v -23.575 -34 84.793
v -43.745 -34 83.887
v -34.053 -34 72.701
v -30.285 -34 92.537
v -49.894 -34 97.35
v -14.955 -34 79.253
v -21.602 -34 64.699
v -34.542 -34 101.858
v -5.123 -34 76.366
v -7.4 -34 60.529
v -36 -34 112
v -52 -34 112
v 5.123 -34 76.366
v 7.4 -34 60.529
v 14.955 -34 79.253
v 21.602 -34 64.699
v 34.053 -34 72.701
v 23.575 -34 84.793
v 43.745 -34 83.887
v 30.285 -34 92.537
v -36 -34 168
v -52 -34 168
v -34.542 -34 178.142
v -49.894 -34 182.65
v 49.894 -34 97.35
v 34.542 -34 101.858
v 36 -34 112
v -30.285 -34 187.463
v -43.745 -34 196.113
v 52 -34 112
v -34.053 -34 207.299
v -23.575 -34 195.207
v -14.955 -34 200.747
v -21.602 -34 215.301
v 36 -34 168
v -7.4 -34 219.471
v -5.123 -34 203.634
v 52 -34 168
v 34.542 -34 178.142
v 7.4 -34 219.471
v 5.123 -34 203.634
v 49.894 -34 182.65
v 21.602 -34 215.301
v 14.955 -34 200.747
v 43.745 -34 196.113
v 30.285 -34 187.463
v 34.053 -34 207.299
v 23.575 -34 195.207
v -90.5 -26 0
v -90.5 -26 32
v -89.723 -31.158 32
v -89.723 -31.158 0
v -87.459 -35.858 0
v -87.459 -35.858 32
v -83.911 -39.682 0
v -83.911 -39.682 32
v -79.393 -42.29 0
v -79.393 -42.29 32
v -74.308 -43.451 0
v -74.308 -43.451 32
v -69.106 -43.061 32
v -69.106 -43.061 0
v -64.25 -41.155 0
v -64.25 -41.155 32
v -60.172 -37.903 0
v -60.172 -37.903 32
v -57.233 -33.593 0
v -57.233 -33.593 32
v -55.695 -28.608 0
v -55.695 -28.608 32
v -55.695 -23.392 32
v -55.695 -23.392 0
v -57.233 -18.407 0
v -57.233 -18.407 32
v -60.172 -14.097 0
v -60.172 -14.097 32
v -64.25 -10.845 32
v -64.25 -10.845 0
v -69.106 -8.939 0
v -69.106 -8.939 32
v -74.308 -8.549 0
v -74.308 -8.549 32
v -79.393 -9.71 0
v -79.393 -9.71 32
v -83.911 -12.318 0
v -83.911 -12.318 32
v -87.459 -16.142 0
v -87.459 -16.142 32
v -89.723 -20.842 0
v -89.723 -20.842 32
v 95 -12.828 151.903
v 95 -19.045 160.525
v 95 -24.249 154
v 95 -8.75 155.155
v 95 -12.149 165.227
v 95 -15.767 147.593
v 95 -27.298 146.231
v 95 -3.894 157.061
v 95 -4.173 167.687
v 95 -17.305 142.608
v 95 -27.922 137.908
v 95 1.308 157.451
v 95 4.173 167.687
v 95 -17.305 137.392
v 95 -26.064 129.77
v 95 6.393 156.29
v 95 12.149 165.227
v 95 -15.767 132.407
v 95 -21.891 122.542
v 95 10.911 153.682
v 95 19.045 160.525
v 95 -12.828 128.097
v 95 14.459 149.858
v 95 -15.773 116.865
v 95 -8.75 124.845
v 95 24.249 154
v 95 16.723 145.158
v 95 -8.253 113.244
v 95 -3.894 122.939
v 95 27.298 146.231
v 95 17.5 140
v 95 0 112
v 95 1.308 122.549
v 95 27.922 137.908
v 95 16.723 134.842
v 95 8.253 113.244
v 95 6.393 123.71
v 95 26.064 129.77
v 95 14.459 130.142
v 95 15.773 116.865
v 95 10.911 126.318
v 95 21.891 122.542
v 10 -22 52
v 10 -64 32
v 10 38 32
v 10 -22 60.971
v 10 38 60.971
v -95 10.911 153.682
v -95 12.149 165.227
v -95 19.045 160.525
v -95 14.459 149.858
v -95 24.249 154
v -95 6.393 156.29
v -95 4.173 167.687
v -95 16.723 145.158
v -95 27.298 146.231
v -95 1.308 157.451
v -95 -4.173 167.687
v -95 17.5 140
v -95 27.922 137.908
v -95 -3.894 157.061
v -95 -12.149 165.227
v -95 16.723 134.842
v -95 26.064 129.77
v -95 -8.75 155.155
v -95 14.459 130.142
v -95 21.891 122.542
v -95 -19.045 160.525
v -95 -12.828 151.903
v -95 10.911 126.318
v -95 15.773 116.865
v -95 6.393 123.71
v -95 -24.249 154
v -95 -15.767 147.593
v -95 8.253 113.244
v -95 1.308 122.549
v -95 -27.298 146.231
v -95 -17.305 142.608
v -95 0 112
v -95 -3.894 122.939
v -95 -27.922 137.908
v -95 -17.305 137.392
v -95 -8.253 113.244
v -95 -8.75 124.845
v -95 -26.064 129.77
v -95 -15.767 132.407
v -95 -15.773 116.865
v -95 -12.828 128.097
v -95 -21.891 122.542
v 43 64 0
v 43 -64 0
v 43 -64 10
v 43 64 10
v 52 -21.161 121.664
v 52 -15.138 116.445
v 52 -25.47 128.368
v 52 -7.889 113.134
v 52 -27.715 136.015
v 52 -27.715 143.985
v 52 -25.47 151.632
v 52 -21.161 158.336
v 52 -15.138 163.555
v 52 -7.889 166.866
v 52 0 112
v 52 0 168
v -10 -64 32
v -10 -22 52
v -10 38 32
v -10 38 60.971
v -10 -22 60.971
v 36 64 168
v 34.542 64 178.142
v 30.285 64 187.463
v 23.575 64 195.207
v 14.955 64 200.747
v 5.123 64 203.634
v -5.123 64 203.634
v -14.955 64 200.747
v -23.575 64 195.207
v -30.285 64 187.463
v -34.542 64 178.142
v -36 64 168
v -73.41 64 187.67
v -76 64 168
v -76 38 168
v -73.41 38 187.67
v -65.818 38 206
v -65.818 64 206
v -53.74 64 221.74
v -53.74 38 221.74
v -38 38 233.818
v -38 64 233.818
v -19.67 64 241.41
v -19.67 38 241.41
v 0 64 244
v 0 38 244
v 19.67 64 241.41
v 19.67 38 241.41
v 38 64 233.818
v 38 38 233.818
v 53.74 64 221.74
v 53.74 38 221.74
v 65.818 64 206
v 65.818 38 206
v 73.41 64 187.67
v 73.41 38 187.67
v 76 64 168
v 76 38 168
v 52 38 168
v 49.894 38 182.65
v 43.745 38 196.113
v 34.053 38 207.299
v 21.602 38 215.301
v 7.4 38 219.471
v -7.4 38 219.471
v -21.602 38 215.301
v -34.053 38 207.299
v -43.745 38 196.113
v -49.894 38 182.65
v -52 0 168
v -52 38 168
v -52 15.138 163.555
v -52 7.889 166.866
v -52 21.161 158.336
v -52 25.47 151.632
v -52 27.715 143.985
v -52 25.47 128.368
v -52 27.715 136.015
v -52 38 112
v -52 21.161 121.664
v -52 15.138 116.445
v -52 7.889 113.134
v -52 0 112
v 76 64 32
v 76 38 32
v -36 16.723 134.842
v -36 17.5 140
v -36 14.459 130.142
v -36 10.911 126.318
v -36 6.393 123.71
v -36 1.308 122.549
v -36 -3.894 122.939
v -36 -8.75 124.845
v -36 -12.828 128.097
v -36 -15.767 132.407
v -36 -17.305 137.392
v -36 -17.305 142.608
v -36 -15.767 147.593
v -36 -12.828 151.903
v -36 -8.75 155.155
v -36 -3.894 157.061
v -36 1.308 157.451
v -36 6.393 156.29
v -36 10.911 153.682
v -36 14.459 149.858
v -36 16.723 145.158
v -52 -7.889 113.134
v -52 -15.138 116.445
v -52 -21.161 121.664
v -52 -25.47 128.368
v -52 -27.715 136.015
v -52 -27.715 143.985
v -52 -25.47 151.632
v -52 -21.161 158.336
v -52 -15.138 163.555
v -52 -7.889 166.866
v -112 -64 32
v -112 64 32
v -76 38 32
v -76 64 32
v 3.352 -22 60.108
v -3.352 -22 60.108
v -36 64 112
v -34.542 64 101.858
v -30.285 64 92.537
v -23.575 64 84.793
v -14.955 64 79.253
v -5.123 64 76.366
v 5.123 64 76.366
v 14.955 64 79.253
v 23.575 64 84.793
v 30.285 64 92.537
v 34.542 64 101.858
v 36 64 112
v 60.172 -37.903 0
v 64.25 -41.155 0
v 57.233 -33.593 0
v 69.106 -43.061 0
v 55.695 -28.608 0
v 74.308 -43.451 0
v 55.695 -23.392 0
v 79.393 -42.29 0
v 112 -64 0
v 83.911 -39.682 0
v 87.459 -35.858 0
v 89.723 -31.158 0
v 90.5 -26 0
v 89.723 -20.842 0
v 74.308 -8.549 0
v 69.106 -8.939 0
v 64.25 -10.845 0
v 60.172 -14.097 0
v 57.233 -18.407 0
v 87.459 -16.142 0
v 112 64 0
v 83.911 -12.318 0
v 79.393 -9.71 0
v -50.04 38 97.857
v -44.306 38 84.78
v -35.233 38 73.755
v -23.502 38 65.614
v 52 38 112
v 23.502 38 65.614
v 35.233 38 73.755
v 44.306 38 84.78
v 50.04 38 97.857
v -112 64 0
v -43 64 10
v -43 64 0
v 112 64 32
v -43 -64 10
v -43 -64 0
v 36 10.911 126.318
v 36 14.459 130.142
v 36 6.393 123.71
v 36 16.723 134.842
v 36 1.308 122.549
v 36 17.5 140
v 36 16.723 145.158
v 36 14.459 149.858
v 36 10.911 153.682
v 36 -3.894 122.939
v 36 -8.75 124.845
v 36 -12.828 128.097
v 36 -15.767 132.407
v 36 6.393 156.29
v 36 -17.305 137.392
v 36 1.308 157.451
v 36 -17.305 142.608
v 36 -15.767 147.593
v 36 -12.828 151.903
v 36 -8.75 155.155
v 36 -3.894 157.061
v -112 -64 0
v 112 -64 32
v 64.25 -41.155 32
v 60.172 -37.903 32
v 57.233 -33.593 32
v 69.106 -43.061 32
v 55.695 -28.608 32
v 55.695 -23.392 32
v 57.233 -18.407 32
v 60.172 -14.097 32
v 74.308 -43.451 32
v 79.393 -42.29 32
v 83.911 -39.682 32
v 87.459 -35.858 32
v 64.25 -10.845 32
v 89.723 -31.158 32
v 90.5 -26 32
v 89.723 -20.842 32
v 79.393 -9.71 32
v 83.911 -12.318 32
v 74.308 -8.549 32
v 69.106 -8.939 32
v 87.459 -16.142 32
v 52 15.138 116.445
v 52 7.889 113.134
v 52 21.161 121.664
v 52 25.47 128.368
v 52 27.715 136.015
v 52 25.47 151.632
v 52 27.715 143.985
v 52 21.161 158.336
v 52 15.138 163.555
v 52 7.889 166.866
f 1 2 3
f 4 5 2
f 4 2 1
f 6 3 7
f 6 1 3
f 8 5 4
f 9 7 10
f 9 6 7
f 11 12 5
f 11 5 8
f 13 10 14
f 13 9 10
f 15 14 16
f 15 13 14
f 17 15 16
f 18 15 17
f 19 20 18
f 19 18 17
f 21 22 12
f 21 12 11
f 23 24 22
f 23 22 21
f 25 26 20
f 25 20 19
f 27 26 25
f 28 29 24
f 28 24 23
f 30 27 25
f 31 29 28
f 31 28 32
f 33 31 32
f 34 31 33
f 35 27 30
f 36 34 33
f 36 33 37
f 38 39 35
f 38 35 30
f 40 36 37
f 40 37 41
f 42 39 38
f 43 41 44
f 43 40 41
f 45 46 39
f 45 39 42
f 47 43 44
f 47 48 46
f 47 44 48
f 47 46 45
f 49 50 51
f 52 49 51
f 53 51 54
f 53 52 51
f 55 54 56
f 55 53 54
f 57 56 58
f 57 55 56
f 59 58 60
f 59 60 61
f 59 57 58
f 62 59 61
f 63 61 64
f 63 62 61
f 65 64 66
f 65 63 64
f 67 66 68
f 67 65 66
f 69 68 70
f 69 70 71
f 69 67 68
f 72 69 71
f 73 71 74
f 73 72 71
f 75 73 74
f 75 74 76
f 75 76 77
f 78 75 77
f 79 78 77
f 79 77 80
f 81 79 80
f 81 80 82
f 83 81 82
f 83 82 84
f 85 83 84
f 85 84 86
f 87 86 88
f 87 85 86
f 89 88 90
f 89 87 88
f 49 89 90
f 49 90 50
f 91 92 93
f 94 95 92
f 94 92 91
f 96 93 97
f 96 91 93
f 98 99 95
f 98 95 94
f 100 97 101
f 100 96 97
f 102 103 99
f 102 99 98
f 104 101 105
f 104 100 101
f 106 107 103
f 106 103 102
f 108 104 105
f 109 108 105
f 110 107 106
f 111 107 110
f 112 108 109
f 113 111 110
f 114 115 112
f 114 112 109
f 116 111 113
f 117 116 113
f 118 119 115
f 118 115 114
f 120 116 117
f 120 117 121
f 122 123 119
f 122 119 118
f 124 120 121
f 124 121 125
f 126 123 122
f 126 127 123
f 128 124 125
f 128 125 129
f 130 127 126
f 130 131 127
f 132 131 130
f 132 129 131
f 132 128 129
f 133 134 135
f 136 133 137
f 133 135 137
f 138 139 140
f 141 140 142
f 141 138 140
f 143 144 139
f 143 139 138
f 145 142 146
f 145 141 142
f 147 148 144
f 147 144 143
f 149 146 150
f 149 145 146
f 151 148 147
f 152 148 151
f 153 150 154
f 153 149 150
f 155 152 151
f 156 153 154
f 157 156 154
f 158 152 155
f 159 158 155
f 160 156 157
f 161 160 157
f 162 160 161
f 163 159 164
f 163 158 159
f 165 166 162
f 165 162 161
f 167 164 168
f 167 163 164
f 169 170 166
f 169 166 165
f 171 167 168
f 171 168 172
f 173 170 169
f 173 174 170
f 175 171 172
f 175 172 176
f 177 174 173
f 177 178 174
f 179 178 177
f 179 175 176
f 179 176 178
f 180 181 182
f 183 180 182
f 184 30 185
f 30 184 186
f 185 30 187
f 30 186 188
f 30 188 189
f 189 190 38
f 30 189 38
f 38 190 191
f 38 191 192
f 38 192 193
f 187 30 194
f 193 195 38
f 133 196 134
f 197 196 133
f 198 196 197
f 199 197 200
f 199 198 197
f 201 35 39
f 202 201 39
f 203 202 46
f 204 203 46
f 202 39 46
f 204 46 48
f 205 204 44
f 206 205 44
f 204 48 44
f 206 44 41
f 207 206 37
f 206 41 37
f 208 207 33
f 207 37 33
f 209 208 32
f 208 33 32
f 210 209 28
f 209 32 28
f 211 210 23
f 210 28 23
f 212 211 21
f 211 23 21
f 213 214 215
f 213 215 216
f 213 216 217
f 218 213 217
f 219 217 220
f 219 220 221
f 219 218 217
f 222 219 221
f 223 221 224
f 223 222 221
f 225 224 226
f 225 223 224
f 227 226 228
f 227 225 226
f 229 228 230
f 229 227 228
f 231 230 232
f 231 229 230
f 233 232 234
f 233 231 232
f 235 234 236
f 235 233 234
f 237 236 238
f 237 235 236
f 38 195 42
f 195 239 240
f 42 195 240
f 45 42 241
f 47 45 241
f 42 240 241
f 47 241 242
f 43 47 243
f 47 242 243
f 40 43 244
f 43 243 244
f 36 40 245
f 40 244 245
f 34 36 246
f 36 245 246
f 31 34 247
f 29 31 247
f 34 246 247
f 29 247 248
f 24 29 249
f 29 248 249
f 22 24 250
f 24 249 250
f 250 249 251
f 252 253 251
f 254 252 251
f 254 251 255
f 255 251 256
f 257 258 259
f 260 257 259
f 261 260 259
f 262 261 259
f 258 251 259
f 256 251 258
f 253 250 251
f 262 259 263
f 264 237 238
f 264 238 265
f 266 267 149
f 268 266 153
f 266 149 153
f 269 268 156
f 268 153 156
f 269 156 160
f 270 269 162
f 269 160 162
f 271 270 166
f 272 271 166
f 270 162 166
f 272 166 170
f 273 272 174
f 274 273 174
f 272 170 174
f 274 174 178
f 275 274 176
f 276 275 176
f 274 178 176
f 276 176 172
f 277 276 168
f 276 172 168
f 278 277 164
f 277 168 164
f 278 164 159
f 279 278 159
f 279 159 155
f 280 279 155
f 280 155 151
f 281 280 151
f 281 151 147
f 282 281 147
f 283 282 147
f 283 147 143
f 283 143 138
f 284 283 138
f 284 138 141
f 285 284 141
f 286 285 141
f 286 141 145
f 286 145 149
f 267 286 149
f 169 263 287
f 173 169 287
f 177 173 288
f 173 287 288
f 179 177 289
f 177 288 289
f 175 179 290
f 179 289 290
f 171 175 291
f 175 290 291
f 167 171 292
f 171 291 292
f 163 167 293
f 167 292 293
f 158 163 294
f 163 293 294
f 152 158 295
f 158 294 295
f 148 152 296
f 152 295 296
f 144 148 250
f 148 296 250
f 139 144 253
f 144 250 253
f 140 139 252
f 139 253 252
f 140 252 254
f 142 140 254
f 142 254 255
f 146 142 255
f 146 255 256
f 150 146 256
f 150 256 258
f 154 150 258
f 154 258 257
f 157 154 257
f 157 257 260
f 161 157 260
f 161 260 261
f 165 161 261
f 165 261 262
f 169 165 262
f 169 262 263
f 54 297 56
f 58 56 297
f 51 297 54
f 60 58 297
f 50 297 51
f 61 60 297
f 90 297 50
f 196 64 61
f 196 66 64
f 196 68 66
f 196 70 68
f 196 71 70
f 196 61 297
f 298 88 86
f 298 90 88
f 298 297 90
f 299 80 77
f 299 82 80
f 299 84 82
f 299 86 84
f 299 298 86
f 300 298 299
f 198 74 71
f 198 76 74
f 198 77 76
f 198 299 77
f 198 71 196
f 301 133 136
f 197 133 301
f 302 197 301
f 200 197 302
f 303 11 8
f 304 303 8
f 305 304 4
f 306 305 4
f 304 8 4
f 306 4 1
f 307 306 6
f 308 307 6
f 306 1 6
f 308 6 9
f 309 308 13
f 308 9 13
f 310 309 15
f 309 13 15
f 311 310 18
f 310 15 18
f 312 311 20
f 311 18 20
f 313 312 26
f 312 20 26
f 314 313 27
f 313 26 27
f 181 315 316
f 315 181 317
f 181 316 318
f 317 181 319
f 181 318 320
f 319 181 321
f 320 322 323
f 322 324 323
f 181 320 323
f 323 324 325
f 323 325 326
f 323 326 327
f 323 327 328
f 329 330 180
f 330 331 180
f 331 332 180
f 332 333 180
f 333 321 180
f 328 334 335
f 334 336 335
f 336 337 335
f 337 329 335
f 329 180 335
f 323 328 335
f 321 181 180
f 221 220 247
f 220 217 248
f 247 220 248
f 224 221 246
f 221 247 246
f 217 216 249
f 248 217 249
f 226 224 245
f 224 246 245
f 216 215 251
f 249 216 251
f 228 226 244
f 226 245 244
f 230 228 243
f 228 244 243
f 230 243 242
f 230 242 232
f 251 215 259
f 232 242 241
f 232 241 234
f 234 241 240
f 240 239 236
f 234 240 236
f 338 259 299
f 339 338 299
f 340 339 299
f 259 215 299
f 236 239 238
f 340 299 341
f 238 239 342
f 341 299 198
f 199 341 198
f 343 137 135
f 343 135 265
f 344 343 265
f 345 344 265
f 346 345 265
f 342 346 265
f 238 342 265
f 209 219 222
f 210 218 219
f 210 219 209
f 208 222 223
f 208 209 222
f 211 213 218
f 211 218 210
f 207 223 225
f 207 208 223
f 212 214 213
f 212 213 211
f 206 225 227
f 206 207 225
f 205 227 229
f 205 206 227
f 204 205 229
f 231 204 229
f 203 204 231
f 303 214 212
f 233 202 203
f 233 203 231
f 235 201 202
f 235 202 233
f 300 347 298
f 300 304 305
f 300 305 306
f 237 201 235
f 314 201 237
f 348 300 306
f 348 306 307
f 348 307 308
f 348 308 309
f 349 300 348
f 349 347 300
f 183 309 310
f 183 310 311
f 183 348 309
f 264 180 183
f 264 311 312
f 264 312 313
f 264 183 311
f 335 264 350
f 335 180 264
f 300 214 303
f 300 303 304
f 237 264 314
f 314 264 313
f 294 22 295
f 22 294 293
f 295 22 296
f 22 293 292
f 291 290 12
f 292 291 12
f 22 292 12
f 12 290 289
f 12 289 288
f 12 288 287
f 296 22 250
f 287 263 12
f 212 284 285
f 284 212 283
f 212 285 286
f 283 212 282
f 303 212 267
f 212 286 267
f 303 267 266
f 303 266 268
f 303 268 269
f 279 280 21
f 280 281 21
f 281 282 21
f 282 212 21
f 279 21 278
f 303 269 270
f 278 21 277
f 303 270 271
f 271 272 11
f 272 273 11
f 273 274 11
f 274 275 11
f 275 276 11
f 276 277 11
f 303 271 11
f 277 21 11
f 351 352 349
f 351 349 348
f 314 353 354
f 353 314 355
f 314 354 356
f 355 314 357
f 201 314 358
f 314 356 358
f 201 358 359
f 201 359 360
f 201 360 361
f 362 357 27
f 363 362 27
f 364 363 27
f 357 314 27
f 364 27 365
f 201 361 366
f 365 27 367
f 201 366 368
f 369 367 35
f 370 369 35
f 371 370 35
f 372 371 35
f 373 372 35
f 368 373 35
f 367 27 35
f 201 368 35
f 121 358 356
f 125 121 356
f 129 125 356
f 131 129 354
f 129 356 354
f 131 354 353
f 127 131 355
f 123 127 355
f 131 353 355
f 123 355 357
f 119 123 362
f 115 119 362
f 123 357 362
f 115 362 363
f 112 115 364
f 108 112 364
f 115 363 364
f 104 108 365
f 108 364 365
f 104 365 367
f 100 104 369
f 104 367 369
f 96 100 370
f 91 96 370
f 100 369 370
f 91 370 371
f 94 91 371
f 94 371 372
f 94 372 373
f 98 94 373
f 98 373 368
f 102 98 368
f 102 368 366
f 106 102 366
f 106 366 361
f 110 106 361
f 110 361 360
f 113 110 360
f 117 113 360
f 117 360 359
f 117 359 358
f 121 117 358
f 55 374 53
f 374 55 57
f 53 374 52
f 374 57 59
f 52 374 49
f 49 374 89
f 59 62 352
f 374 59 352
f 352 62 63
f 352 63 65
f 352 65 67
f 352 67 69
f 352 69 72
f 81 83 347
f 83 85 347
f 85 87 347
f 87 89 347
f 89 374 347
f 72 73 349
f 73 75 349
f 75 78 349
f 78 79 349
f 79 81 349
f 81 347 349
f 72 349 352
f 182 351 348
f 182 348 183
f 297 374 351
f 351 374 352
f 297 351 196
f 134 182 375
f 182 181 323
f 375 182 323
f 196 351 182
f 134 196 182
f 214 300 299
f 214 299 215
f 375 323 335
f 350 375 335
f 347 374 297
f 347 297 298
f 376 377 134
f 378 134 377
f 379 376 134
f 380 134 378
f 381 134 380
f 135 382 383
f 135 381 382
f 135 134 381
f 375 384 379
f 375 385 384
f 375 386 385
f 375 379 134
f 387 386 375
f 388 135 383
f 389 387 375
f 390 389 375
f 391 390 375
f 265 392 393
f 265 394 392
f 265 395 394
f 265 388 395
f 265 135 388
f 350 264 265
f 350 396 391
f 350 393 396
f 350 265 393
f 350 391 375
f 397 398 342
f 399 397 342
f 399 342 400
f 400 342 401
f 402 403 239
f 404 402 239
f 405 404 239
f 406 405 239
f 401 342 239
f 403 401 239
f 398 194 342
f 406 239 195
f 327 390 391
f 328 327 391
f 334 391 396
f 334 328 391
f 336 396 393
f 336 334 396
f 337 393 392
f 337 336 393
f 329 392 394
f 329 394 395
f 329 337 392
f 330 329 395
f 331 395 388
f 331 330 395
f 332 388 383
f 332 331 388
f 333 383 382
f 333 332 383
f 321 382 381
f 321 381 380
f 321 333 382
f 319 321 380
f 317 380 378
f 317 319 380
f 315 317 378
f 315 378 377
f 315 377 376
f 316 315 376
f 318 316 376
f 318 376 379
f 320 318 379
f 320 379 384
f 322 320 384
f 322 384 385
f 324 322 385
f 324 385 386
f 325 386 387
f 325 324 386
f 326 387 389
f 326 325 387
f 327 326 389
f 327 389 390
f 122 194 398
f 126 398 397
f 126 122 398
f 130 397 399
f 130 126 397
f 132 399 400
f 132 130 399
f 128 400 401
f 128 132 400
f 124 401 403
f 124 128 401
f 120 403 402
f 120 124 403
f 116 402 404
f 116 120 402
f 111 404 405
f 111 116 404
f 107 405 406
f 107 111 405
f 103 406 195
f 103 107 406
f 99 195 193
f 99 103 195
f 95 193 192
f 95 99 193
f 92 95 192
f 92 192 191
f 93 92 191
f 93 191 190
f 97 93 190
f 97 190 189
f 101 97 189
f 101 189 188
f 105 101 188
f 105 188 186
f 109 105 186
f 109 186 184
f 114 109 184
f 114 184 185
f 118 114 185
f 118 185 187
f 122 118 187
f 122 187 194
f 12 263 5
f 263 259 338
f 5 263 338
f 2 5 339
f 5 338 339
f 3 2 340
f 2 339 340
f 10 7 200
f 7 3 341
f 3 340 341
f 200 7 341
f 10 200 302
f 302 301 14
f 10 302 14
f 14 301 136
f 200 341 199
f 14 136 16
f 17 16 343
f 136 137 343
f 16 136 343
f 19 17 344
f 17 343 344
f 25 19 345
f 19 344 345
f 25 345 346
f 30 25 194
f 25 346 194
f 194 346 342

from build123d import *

# Parameters (mm, degrees)
SKETCH_1_W           = 224
SKETCH_1_H           = 128
SKETCH_1_R           = 17.5
EXTRUDE_1_DEPTH      = 32
SKETCH_2_W           = 86
SKETCH_2_H           = 20
CUT_EXTRUDE_1_DEPTH  = 145
EXTRUDE_2_DEPTH      = 26
EXTRUDE_3_DEPTH      = 72
CUT_EXTRUDE_2_DEPTH  = 131
SKETCH_6_R           = 28
EXTRUDE_5_DEPTH      = 43
EXTRUDE_START        = 43
SKETCH_7_R           = 28
EXTRUDE_6_DEPTH      = 43
SKETCH_8_R           = 17.5
CUT_EXTRUDE_3_DEPTH  = 241
EXTRUDE_7_DEPTH      = 10
EXTRUDE_7_DEPTH_BACK = 10


with BuildPart() as part:
    # 草图1 → 凸台-拉伸1 (new body)
    with BuildSketch(Plane.XY):
        Rectangle(SKETCH_1_W, SKETCH_1_H)
        with Locations((73, -26)):
            Circle(SKETCH_1_R, mode=Mode.SUBTRACT)
        with Locations(Location((-73, -26, 0), (0, 0, 180))):
            Circle(SKETCH_1_R, mode=Mode.SUBTRACT)
    extrude(amount=EXTRUDE_1_DEPTH)

    # 草图2 → 切除-拉伸1 (cut)
    with BuildSketch(Plane.XZ.offset(64)):
        Rectangle(SKETCH_2_W, SKETCH_2_H)
    extrude(amount=-CUT_EXTRUDE_1_DEPTH, mode=Mode.SUBTRACT)

    # 草图3 → 凸台-拉伸2 (add)
    with BuildSketch(Plane(origin=(0, 64, 0), x_dir=(1, 0, 0), z_dir=(0, 1, 0))):
        with BuildLine():
            Line((76, -168), (76, -32))
            Line((76, -32), (-76, -32))
            Line((-76, -32), (-76, -168))
            ThreePointArc((-76, -168), (0, -244), (76, -168))
        make_face()
    extrude(amount=-EXTRUDE_2_DEPTH)

    # 草图4 → 凸台-拉伸3 (add)
    with BuildSketch(Plane.XZ.offset(-38)):
        with BuildLine():
            Line((-52, 168), (-52, 112))
            ThreePointArc((-52, 112), (0, 60), (52, 112))
            Line((52, 112), (52, 168))
            ThreePointArc((52, 168), (0, 220), (-52, 168))
        make_face()
    extrude(amount=EXTRUDE_3_DEPTH)

    # 草图5 → 切除-拉伸2 (cut)
    with BuildSketch(Plane.XZ.offset(34)):
        with BuildLine():
            Line((-36, 168), (-36, 112))
            ThreePointArc((-36, 112), (0, 76), (36, 112))
            Line((36, 112), (36, 168))
            ThreePointArc((36, 168), (0, 204), (-36, 168))
        make_face()
    extrude(amount=-CUT_EXTRUDE_2_DEPTH, mode=Mode.SUBTRACT)

    # 草图6 → 凸台-拉伸5 (add)
    with BuildSketch(Plane.ZY.offset(52)):
        with Locations(Location((140, 0, 0), (0, 0, 180))):
            Circle(SKETCH_6_R)
    extrude(amount=EXTRUDE_5_DEPTH)

    # 草图7 → 凸台-拉伸6 (add)
    with BuildSketch(Plane(origin=(52, 0, 0), x_dir=(0, 0, -1), z_dir=(1, 0, 0)).offset(EXTRUDE_START)):
        with Locations((-140, 0)):
            Circle(SKETCH_7_R)
    extrude(amount=-EXTRUDE_6_DEPTH)

    # 草图8 → 切除-拉伸3 (cut)
    with BuildSketch(Plane.ZY.offset(95)):
        with Locations(Location((140, 0, 0), (0, 0, 90))):
            Circle(SKETCH_8_R)
    extrude(amount=-CUT_EXTRUDE_3_DEPTH, mode=Mode.SUBTRACT)

    # 草图9 → 凸台-拉伸7 (add, two sides: drawn at the far end of the back side and taken through both)
    with BuildSketch(Plane(origin=(0, 0, 0), x_dir=(0, 0, -1), z_dir=(1, 0, 0)).offset(-EXTRUDE_7_DEPTH_BACK)):
        Polygon((-52, -22), (-67.637033122, -22), (-67.637033122, 38), (-32, 38), (-32, -64), align=None)
    extrude(amount=EXTRUDE_7_DEPTH + EXTRUDE_7_DEPTH_BACK)


solid = part.part
